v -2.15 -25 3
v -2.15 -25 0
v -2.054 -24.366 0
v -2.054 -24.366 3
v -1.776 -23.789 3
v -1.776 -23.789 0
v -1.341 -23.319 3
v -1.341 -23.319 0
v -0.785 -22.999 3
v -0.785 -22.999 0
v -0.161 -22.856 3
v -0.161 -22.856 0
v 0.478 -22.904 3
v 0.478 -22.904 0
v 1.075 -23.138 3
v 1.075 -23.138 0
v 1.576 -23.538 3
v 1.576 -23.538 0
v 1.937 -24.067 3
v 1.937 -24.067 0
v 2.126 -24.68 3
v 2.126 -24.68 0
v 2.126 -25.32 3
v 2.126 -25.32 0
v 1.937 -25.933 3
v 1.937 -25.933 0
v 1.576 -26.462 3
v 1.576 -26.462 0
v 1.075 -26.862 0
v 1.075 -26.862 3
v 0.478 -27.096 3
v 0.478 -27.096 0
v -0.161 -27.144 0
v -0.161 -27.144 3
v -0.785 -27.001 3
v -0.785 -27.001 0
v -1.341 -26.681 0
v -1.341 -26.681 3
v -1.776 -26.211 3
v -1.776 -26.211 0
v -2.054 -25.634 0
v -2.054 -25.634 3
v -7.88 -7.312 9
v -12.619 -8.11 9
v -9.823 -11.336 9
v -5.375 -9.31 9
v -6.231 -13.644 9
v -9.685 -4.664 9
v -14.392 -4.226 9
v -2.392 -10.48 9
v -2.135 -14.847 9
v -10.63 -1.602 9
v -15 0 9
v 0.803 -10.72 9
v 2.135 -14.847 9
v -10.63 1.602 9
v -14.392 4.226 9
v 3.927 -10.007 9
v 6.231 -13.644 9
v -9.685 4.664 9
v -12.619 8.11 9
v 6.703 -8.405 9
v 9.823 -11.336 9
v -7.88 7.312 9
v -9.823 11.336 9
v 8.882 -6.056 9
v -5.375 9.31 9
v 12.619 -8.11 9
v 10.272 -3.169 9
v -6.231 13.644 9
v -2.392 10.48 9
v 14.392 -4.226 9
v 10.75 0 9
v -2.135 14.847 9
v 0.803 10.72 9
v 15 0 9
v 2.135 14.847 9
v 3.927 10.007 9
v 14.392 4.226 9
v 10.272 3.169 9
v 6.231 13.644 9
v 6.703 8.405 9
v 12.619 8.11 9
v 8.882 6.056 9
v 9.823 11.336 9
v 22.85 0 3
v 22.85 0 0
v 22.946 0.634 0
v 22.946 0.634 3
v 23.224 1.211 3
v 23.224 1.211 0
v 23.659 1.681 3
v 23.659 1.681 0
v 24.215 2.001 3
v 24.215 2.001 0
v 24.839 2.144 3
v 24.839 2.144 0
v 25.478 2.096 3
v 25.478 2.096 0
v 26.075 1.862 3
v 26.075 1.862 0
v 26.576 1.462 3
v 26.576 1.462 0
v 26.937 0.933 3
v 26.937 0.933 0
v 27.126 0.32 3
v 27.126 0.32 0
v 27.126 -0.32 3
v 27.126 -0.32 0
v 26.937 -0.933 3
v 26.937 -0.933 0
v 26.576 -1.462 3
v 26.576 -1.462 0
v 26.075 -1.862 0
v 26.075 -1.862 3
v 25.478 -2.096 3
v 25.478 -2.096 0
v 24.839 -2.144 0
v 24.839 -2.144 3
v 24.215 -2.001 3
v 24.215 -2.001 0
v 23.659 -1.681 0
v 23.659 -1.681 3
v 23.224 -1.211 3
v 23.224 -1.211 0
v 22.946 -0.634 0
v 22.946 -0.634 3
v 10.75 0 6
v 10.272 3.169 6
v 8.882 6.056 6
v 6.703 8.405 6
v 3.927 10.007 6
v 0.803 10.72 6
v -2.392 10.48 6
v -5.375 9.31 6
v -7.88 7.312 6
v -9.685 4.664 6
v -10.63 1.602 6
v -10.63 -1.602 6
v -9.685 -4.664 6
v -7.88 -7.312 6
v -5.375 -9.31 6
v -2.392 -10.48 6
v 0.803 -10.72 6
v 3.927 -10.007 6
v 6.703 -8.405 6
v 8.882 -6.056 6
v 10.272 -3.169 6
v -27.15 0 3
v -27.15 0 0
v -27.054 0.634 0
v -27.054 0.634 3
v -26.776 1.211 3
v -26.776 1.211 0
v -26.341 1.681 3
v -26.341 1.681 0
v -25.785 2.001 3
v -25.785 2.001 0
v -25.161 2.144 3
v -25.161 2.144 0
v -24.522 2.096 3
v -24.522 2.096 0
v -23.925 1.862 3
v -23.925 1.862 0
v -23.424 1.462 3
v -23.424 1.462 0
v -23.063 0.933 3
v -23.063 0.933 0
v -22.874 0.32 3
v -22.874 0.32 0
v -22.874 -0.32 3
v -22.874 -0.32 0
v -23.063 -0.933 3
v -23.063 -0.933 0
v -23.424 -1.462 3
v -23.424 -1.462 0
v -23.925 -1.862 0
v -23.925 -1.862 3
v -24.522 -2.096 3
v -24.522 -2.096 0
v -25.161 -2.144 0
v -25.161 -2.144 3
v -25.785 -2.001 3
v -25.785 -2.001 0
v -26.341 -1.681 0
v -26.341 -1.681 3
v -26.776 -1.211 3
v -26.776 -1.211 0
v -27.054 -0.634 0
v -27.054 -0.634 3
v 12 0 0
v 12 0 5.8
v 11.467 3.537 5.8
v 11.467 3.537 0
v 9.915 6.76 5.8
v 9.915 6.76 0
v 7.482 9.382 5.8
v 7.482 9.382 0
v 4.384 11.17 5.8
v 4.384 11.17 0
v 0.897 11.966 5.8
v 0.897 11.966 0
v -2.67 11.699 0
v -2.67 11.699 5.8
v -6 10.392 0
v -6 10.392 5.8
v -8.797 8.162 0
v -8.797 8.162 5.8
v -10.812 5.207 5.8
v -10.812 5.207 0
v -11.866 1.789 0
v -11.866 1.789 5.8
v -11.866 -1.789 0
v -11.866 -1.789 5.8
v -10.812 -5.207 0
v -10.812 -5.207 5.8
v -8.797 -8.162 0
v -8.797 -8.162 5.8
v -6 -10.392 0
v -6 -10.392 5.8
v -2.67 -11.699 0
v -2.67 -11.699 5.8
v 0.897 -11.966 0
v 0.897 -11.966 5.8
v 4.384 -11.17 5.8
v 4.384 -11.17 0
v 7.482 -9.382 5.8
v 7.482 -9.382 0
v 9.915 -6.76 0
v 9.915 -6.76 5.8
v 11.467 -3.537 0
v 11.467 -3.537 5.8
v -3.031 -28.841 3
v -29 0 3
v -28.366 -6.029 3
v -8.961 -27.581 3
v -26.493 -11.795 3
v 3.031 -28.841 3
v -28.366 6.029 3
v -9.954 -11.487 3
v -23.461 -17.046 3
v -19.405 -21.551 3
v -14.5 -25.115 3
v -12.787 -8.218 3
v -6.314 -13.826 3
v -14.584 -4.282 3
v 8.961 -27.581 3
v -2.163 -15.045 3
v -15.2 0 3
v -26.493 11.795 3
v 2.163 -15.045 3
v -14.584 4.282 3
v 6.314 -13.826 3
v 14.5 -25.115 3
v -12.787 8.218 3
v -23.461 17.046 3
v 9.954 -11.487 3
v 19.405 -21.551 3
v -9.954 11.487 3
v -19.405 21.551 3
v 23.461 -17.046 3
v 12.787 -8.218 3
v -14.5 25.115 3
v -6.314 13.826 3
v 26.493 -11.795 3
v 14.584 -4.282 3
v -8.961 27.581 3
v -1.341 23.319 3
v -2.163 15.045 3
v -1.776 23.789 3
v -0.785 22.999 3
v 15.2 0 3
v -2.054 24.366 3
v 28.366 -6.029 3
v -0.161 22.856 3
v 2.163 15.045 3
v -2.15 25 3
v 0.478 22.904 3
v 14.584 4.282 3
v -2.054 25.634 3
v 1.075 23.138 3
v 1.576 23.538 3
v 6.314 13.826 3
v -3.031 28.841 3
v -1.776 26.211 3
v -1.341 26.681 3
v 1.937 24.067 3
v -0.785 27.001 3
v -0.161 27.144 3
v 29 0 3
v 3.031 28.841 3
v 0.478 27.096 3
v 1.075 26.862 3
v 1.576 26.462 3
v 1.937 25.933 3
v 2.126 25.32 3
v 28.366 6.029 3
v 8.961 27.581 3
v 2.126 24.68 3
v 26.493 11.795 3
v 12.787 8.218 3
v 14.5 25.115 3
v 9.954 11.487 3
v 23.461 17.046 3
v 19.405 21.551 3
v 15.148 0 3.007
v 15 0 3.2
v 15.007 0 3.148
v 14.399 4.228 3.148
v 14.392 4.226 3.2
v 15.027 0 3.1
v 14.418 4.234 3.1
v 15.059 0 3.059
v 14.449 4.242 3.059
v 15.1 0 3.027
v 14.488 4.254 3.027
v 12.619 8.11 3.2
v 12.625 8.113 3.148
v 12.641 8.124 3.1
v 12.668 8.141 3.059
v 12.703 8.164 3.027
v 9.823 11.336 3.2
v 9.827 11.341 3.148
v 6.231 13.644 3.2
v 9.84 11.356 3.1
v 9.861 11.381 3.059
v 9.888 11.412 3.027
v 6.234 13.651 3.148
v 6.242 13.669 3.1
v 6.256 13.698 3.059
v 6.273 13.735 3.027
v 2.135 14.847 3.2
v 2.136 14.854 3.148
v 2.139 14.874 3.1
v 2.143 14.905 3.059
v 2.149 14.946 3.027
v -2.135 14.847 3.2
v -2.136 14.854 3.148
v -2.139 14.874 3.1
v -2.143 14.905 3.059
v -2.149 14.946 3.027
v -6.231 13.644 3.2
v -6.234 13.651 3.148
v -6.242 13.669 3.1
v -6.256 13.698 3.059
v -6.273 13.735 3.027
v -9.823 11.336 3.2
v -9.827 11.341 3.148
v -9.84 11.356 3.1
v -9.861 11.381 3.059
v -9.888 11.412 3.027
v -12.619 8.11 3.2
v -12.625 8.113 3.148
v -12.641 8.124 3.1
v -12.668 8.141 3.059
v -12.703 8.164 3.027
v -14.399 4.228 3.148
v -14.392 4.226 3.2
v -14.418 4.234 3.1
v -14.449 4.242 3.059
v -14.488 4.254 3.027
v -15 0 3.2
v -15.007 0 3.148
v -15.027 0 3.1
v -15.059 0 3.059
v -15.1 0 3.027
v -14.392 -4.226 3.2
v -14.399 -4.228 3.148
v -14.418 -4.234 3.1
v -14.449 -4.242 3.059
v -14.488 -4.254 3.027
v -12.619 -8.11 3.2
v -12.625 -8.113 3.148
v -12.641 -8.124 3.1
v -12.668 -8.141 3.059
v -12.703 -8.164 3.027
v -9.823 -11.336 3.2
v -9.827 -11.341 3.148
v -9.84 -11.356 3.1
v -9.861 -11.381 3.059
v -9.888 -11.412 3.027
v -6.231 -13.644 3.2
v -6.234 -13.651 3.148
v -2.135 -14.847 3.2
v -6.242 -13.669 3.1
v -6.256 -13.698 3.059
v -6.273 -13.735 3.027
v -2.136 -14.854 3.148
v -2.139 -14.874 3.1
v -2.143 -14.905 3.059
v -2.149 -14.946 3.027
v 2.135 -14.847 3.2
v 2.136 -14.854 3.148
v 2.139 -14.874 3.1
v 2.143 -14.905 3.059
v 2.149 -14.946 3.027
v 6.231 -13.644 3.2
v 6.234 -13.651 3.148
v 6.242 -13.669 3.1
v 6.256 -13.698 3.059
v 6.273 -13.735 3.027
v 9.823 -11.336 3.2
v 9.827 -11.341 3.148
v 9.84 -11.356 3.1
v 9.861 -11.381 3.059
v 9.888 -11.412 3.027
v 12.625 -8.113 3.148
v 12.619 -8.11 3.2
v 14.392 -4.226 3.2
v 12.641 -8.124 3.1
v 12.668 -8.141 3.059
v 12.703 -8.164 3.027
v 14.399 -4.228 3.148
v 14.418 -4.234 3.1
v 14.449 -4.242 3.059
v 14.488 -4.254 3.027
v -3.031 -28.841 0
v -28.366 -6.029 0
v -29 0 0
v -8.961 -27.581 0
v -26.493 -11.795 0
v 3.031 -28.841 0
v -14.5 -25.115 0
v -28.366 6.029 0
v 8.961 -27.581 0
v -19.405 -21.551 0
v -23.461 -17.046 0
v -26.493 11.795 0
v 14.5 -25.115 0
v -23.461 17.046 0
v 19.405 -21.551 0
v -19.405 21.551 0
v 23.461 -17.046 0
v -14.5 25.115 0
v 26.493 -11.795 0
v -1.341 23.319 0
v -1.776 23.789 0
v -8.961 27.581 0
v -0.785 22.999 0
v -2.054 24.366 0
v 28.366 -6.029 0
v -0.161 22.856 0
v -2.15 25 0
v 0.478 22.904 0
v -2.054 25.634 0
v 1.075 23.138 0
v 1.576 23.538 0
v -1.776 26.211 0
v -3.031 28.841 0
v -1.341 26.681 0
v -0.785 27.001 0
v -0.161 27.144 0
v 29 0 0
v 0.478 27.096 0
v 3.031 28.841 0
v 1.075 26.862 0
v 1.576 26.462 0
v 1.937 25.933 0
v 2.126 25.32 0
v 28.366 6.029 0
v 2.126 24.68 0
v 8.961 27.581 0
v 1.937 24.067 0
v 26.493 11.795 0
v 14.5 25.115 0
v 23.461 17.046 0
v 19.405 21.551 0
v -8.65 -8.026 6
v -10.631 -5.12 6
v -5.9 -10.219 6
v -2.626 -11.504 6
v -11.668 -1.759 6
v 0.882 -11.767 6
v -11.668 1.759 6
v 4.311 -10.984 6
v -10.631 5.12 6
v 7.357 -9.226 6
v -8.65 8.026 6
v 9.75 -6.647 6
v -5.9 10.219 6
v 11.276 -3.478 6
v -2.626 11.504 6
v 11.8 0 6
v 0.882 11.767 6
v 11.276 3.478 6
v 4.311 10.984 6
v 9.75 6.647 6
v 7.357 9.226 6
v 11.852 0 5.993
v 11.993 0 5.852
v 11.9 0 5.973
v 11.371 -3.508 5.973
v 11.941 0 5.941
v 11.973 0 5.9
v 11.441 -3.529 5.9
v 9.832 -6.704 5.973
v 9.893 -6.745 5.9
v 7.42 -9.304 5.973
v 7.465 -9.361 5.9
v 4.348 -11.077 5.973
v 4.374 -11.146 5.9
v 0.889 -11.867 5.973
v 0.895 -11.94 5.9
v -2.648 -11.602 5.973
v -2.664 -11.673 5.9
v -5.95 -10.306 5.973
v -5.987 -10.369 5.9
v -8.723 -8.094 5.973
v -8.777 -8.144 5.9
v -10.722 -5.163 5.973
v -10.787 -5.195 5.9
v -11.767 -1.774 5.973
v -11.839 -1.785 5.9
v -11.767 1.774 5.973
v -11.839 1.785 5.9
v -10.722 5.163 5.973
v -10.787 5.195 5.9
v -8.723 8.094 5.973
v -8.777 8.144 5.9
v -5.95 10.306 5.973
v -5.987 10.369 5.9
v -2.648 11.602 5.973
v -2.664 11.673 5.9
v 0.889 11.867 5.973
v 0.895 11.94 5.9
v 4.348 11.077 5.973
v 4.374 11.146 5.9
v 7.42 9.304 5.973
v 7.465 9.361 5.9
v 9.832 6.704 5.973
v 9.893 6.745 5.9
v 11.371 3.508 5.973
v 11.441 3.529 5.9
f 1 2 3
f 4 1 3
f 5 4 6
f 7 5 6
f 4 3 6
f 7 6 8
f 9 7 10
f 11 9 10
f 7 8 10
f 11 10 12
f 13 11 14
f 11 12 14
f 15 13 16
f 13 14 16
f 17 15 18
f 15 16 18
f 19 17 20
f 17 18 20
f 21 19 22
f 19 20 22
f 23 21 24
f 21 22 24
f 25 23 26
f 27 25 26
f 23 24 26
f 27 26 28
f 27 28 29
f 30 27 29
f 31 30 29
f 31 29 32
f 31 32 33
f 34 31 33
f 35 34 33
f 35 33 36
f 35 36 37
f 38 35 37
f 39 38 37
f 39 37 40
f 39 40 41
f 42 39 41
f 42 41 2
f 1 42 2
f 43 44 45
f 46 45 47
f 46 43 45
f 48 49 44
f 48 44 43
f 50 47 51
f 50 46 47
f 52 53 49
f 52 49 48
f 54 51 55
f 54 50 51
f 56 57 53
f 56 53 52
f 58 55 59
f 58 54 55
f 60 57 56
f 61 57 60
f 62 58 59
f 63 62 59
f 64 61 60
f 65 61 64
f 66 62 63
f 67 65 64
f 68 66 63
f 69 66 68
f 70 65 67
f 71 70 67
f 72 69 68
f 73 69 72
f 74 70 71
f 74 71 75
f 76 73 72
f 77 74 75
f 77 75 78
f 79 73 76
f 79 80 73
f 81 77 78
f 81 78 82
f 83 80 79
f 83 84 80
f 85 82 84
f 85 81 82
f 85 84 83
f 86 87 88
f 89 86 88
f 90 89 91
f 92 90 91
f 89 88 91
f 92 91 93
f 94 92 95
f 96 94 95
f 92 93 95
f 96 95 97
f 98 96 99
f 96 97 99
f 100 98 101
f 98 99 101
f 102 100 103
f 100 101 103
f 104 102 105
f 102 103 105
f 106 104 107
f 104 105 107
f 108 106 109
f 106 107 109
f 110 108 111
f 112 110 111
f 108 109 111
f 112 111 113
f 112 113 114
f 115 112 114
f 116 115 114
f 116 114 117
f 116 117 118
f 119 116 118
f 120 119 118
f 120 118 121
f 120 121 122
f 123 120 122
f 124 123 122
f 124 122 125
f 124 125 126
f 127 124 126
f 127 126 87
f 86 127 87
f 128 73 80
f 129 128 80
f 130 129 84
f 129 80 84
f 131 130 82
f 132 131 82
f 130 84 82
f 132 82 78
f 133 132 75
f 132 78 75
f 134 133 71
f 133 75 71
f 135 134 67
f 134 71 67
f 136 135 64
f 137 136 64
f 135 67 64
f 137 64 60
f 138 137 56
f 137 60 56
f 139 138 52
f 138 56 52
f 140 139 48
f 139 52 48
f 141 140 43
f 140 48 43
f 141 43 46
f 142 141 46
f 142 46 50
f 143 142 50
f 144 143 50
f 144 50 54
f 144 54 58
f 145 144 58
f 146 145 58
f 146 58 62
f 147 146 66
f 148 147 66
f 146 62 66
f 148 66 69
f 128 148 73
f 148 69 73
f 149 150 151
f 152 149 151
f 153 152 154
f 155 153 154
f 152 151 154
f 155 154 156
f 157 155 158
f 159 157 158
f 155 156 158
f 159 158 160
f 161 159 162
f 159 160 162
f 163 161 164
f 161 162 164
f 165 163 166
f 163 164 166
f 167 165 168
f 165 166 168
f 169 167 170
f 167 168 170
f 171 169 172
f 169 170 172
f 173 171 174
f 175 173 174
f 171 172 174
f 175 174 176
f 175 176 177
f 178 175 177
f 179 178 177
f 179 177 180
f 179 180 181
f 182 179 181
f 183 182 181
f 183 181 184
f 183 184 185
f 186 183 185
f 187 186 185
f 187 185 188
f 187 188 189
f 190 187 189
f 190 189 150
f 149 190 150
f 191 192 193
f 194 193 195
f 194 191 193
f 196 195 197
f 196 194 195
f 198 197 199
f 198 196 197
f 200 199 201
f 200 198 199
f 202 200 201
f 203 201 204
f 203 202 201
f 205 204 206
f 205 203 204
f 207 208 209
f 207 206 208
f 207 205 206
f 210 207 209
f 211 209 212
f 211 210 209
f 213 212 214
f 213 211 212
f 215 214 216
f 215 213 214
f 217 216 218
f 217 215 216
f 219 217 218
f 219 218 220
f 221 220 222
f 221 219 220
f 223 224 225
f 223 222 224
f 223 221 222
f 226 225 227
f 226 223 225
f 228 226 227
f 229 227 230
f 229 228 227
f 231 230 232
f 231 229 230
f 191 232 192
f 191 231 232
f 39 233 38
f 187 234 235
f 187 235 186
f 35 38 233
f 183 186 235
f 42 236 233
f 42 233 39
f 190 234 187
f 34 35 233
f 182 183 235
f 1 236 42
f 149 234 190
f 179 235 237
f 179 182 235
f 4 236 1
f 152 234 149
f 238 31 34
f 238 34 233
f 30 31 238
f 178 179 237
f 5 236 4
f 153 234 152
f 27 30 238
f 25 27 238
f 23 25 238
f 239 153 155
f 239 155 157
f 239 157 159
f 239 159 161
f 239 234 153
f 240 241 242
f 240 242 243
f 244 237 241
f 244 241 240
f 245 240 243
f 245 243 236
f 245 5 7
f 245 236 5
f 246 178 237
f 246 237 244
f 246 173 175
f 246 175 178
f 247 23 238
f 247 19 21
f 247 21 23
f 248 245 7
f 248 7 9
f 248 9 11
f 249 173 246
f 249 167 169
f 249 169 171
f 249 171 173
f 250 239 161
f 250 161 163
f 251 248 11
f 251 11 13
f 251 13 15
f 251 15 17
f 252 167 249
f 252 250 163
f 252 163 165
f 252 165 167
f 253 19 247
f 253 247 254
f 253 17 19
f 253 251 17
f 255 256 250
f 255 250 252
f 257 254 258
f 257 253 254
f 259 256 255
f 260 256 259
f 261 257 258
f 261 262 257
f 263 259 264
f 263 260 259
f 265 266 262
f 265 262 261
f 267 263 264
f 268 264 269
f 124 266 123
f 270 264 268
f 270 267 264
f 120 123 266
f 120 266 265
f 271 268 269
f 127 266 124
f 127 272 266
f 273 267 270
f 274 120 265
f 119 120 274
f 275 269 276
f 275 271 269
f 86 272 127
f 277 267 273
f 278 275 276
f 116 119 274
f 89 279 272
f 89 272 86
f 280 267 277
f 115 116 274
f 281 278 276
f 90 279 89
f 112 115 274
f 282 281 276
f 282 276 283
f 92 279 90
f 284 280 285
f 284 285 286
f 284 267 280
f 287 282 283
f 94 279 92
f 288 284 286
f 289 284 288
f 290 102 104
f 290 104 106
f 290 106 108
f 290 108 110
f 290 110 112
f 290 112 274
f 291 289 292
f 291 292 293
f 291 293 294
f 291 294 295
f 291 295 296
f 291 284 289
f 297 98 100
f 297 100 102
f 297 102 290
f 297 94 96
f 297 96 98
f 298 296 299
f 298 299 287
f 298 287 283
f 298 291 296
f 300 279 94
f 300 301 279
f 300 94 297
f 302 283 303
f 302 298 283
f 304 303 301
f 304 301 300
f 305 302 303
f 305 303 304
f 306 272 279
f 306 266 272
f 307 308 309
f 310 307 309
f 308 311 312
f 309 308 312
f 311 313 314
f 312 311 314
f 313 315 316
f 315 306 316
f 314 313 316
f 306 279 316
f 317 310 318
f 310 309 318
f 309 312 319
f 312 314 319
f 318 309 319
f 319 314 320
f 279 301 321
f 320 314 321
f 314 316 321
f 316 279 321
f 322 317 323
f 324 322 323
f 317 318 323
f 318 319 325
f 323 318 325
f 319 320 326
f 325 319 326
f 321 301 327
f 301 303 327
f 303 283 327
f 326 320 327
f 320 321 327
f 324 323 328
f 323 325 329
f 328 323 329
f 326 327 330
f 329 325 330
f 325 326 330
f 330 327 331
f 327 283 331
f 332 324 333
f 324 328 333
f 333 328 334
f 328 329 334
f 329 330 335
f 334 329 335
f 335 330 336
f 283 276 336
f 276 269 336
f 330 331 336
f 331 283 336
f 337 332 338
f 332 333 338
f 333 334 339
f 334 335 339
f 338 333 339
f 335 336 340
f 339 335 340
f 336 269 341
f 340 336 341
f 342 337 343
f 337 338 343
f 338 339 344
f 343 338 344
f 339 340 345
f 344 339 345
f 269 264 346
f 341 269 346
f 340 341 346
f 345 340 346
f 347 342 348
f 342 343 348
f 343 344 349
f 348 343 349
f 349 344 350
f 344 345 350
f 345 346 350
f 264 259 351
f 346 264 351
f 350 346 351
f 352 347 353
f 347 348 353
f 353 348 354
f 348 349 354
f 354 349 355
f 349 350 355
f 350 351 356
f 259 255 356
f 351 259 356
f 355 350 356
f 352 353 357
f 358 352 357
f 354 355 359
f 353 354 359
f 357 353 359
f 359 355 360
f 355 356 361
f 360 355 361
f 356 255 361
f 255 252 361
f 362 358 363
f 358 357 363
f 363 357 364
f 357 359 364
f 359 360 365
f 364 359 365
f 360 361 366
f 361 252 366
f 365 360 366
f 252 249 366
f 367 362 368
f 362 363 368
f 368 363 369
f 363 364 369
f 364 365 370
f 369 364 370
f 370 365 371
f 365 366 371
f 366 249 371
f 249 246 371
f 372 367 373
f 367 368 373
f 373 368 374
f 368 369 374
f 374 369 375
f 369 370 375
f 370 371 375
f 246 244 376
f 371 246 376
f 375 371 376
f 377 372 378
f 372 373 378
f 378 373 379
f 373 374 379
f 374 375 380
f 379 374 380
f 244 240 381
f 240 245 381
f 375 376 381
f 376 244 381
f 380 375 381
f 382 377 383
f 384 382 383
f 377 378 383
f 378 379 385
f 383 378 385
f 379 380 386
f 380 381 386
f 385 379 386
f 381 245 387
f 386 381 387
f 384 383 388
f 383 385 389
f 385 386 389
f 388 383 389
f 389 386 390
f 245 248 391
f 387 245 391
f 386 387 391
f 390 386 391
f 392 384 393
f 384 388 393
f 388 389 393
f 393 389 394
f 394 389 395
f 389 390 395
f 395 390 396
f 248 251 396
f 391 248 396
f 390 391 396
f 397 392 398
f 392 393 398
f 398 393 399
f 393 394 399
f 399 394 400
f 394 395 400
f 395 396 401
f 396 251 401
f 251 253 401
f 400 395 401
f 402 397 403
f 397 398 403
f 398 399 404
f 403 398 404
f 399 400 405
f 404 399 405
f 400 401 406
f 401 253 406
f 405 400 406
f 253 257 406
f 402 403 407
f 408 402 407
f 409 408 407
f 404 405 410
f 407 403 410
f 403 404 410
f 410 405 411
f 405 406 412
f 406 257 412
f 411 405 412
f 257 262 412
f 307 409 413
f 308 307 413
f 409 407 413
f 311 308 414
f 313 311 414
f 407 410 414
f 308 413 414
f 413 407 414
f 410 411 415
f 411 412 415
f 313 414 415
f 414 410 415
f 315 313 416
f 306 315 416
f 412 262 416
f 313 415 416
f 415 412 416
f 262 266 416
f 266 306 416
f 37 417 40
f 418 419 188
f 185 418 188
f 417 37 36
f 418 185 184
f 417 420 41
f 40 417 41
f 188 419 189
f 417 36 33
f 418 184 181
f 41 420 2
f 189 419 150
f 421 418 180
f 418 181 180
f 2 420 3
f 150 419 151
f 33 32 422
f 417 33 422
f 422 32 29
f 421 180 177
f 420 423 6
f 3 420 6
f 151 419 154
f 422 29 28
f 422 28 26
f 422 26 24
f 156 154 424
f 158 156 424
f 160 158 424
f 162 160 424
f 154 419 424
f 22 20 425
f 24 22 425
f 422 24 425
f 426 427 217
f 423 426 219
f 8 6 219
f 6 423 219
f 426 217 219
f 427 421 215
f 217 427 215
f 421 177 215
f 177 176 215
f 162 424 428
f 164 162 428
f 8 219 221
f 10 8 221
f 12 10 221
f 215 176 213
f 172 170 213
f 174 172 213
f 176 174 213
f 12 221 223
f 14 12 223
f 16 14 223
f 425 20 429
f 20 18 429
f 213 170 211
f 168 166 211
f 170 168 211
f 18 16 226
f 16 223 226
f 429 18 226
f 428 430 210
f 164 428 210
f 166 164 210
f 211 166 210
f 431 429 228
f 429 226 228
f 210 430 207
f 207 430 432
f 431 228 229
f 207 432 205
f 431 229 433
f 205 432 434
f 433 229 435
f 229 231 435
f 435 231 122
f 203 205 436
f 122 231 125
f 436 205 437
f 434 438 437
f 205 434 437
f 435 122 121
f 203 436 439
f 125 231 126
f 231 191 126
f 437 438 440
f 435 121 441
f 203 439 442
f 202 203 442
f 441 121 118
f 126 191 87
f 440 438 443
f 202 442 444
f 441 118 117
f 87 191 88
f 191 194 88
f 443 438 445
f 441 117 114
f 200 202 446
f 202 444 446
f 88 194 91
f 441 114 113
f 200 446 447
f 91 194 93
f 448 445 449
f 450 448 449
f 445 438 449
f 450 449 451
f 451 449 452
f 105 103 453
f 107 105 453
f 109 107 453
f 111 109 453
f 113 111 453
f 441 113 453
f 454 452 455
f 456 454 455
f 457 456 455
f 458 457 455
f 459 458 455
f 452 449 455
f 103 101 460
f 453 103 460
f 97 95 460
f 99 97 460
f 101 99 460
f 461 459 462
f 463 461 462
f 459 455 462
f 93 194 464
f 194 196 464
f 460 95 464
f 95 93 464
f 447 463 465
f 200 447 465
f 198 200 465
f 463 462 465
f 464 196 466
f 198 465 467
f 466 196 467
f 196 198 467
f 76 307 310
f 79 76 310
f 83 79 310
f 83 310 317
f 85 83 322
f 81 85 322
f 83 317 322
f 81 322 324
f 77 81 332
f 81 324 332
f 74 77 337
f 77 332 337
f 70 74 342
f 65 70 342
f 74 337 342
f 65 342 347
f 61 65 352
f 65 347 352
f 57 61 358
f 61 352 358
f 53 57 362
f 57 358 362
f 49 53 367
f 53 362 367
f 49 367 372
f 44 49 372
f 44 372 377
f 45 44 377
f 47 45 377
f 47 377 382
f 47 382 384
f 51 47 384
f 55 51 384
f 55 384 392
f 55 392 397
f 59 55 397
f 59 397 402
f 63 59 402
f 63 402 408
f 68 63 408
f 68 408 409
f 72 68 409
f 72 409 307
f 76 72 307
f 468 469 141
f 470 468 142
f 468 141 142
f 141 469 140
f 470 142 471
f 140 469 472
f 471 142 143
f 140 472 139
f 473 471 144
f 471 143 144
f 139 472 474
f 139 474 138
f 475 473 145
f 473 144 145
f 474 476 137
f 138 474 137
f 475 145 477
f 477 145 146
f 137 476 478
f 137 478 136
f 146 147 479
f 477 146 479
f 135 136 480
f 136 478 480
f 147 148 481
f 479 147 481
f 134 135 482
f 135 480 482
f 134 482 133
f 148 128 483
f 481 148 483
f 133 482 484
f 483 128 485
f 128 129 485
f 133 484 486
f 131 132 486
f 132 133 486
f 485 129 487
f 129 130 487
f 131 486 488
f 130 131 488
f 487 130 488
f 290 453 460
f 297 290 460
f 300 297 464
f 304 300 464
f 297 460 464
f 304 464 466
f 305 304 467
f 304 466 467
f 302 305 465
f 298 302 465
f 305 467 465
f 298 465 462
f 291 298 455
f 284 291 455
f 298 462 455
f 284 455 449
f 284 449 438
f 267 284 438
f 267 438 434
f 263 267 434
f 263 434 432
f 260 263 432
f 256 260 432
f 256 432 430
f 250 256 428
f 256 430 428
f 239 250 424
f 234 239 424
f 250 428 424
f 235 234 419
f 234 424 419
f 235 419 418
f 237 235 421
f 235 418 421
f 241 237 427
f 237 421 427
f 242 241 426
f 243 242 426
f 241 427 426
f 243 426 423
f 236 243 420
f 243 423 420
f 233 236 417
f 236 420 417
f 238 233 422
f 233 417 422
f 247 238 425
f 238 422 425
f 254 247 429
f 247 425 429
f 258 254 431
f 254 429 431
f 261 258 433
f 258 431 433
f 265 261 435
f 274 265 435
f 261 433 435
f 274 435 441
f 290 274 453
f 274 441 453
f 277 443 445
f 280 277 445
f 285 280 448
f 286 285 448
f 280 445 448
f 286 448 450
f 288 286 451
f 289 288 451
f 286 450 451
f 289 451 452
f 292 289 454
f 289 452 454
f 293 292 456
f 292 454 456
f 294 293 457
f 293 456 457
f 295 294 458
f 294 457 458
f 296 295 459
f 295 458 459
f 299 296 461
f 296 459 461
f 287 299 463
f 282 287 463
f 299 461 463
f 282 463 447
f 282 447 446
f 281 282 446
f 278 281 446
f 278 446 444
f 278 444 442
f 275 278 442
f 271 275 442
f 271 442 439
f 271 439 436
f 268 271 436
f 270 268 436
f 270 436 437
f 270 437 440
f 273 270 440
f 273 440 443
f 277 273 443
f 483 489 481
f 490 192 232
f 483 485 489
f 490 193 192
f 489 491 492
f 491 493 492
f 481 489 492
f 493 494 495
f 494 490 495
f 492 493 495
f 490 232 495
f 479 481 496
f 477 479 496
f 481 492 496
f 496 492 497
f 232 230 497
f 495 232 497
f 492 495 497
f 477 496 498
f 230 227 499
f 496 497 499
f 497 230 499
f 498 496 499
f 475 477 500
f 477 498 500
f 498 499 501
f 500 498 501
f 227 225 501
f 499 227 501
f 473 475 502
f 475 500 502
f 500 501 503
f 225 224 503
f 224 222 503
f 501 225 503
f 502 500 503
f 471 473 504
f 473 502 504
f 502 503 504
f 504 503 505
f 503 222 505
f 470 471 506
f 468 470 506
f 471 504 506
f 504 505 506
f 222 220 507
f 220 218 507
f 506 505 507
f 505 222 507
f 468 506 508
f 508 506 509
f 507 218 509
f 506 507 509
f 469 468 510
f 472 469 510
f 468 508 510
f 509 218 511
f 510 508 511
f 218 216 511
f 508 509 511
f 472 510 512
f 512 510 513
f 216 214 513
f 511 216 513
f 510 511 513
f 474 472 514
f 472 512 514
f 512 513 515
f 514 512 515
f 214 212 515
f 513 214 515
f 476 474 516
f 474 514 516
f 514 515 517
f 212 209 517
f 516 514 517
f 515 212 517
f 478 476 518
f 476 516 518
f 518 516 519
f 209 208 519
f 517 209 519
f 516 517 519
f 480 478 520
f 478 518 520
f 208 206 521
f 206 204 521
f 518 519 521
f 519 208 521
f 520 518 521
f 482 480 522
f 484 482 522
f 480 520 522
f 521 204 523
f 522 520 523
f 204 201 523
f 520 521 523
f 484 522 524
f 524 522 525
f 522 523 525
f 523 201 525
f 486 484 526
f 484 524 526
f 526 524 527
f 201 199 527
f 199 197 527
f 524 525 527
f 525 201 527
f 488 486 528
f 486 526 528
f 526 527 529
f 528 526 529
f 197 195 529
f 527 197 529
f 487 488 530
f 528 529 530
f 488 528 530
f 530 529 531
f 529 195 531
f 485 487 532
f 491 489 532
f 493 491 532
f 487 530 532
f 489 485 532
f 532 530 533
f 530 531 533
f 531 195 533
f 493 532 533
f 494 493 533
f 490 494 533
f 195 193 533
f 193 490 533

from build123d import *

# Parameters (mm, degrees)
SKETCH1_R            = 29
SKETCH1_R_2          = 12
BOSS_EXTRUDE1_DEPTH  = 3
SKETCH2_R            = 15
SKETCH2_R_2          = 12
BOSS_EXTRUDE2_DEPTH  = 6
SKETCH3_R            = 15
SKETCH3_R_2          = 10.75
BOSS_EXTRUDE3_DEPTH  = 3
M4_CLEARANCE_HOLE1_D = 4.3
FILLET1_R            = 0.2


with BuildPart() as part:
    # Sketch1 → Boss-Extrude1 (new body)
    with BuildSketch(Plane.XY):
        Circle(SKETCH1_R)
        Circle(SKETCH1_R_2, mode=Mode.SUBTRACT)
    extrude(amount=BOSS_EXTRUDE1_DEPTH)

    # Sketch2 → Boss-Extrude2 (add)
    with BuildSketch(Plane.XY.offset(3)):
        Circle(SKETCH2_R)
        Circle(SKETCH2_R_2, mode=Mode.SUBTRACT)
    extrude(amount=BOSS_EXTRUDE2_DEPTH)

    # Sketch3 → Boss-Extrude3 (add)
    with BuildSketch(Plane.XY.offset(9)):
        Circle(SKETCH3_R)
        Circle(SKETCH3_R_2, mode=Mode.SUBTRACT)
    extrude(amount=-BOSS_EXTRUDE3_DEPTH)

    # M4 Clearance Hole1 (through all)
    with Locations(Plane.XY.offset(3)):
        with Locations((0, 25), (25, 0), (0, -25), (-25, 0), (0, 0)):
            Hole(M4_CLEARANCE_HOLE1_D / 2)

    # Fillet1
    fillet1_edges = [part.edges().sort_by_distance(p)[0] for p in [
        (-15, 0, 3),
        (-12, 0, 6),
    ]]
    fillet(fillet1_edges, radius=FILLET1_R)


solid = part.part
